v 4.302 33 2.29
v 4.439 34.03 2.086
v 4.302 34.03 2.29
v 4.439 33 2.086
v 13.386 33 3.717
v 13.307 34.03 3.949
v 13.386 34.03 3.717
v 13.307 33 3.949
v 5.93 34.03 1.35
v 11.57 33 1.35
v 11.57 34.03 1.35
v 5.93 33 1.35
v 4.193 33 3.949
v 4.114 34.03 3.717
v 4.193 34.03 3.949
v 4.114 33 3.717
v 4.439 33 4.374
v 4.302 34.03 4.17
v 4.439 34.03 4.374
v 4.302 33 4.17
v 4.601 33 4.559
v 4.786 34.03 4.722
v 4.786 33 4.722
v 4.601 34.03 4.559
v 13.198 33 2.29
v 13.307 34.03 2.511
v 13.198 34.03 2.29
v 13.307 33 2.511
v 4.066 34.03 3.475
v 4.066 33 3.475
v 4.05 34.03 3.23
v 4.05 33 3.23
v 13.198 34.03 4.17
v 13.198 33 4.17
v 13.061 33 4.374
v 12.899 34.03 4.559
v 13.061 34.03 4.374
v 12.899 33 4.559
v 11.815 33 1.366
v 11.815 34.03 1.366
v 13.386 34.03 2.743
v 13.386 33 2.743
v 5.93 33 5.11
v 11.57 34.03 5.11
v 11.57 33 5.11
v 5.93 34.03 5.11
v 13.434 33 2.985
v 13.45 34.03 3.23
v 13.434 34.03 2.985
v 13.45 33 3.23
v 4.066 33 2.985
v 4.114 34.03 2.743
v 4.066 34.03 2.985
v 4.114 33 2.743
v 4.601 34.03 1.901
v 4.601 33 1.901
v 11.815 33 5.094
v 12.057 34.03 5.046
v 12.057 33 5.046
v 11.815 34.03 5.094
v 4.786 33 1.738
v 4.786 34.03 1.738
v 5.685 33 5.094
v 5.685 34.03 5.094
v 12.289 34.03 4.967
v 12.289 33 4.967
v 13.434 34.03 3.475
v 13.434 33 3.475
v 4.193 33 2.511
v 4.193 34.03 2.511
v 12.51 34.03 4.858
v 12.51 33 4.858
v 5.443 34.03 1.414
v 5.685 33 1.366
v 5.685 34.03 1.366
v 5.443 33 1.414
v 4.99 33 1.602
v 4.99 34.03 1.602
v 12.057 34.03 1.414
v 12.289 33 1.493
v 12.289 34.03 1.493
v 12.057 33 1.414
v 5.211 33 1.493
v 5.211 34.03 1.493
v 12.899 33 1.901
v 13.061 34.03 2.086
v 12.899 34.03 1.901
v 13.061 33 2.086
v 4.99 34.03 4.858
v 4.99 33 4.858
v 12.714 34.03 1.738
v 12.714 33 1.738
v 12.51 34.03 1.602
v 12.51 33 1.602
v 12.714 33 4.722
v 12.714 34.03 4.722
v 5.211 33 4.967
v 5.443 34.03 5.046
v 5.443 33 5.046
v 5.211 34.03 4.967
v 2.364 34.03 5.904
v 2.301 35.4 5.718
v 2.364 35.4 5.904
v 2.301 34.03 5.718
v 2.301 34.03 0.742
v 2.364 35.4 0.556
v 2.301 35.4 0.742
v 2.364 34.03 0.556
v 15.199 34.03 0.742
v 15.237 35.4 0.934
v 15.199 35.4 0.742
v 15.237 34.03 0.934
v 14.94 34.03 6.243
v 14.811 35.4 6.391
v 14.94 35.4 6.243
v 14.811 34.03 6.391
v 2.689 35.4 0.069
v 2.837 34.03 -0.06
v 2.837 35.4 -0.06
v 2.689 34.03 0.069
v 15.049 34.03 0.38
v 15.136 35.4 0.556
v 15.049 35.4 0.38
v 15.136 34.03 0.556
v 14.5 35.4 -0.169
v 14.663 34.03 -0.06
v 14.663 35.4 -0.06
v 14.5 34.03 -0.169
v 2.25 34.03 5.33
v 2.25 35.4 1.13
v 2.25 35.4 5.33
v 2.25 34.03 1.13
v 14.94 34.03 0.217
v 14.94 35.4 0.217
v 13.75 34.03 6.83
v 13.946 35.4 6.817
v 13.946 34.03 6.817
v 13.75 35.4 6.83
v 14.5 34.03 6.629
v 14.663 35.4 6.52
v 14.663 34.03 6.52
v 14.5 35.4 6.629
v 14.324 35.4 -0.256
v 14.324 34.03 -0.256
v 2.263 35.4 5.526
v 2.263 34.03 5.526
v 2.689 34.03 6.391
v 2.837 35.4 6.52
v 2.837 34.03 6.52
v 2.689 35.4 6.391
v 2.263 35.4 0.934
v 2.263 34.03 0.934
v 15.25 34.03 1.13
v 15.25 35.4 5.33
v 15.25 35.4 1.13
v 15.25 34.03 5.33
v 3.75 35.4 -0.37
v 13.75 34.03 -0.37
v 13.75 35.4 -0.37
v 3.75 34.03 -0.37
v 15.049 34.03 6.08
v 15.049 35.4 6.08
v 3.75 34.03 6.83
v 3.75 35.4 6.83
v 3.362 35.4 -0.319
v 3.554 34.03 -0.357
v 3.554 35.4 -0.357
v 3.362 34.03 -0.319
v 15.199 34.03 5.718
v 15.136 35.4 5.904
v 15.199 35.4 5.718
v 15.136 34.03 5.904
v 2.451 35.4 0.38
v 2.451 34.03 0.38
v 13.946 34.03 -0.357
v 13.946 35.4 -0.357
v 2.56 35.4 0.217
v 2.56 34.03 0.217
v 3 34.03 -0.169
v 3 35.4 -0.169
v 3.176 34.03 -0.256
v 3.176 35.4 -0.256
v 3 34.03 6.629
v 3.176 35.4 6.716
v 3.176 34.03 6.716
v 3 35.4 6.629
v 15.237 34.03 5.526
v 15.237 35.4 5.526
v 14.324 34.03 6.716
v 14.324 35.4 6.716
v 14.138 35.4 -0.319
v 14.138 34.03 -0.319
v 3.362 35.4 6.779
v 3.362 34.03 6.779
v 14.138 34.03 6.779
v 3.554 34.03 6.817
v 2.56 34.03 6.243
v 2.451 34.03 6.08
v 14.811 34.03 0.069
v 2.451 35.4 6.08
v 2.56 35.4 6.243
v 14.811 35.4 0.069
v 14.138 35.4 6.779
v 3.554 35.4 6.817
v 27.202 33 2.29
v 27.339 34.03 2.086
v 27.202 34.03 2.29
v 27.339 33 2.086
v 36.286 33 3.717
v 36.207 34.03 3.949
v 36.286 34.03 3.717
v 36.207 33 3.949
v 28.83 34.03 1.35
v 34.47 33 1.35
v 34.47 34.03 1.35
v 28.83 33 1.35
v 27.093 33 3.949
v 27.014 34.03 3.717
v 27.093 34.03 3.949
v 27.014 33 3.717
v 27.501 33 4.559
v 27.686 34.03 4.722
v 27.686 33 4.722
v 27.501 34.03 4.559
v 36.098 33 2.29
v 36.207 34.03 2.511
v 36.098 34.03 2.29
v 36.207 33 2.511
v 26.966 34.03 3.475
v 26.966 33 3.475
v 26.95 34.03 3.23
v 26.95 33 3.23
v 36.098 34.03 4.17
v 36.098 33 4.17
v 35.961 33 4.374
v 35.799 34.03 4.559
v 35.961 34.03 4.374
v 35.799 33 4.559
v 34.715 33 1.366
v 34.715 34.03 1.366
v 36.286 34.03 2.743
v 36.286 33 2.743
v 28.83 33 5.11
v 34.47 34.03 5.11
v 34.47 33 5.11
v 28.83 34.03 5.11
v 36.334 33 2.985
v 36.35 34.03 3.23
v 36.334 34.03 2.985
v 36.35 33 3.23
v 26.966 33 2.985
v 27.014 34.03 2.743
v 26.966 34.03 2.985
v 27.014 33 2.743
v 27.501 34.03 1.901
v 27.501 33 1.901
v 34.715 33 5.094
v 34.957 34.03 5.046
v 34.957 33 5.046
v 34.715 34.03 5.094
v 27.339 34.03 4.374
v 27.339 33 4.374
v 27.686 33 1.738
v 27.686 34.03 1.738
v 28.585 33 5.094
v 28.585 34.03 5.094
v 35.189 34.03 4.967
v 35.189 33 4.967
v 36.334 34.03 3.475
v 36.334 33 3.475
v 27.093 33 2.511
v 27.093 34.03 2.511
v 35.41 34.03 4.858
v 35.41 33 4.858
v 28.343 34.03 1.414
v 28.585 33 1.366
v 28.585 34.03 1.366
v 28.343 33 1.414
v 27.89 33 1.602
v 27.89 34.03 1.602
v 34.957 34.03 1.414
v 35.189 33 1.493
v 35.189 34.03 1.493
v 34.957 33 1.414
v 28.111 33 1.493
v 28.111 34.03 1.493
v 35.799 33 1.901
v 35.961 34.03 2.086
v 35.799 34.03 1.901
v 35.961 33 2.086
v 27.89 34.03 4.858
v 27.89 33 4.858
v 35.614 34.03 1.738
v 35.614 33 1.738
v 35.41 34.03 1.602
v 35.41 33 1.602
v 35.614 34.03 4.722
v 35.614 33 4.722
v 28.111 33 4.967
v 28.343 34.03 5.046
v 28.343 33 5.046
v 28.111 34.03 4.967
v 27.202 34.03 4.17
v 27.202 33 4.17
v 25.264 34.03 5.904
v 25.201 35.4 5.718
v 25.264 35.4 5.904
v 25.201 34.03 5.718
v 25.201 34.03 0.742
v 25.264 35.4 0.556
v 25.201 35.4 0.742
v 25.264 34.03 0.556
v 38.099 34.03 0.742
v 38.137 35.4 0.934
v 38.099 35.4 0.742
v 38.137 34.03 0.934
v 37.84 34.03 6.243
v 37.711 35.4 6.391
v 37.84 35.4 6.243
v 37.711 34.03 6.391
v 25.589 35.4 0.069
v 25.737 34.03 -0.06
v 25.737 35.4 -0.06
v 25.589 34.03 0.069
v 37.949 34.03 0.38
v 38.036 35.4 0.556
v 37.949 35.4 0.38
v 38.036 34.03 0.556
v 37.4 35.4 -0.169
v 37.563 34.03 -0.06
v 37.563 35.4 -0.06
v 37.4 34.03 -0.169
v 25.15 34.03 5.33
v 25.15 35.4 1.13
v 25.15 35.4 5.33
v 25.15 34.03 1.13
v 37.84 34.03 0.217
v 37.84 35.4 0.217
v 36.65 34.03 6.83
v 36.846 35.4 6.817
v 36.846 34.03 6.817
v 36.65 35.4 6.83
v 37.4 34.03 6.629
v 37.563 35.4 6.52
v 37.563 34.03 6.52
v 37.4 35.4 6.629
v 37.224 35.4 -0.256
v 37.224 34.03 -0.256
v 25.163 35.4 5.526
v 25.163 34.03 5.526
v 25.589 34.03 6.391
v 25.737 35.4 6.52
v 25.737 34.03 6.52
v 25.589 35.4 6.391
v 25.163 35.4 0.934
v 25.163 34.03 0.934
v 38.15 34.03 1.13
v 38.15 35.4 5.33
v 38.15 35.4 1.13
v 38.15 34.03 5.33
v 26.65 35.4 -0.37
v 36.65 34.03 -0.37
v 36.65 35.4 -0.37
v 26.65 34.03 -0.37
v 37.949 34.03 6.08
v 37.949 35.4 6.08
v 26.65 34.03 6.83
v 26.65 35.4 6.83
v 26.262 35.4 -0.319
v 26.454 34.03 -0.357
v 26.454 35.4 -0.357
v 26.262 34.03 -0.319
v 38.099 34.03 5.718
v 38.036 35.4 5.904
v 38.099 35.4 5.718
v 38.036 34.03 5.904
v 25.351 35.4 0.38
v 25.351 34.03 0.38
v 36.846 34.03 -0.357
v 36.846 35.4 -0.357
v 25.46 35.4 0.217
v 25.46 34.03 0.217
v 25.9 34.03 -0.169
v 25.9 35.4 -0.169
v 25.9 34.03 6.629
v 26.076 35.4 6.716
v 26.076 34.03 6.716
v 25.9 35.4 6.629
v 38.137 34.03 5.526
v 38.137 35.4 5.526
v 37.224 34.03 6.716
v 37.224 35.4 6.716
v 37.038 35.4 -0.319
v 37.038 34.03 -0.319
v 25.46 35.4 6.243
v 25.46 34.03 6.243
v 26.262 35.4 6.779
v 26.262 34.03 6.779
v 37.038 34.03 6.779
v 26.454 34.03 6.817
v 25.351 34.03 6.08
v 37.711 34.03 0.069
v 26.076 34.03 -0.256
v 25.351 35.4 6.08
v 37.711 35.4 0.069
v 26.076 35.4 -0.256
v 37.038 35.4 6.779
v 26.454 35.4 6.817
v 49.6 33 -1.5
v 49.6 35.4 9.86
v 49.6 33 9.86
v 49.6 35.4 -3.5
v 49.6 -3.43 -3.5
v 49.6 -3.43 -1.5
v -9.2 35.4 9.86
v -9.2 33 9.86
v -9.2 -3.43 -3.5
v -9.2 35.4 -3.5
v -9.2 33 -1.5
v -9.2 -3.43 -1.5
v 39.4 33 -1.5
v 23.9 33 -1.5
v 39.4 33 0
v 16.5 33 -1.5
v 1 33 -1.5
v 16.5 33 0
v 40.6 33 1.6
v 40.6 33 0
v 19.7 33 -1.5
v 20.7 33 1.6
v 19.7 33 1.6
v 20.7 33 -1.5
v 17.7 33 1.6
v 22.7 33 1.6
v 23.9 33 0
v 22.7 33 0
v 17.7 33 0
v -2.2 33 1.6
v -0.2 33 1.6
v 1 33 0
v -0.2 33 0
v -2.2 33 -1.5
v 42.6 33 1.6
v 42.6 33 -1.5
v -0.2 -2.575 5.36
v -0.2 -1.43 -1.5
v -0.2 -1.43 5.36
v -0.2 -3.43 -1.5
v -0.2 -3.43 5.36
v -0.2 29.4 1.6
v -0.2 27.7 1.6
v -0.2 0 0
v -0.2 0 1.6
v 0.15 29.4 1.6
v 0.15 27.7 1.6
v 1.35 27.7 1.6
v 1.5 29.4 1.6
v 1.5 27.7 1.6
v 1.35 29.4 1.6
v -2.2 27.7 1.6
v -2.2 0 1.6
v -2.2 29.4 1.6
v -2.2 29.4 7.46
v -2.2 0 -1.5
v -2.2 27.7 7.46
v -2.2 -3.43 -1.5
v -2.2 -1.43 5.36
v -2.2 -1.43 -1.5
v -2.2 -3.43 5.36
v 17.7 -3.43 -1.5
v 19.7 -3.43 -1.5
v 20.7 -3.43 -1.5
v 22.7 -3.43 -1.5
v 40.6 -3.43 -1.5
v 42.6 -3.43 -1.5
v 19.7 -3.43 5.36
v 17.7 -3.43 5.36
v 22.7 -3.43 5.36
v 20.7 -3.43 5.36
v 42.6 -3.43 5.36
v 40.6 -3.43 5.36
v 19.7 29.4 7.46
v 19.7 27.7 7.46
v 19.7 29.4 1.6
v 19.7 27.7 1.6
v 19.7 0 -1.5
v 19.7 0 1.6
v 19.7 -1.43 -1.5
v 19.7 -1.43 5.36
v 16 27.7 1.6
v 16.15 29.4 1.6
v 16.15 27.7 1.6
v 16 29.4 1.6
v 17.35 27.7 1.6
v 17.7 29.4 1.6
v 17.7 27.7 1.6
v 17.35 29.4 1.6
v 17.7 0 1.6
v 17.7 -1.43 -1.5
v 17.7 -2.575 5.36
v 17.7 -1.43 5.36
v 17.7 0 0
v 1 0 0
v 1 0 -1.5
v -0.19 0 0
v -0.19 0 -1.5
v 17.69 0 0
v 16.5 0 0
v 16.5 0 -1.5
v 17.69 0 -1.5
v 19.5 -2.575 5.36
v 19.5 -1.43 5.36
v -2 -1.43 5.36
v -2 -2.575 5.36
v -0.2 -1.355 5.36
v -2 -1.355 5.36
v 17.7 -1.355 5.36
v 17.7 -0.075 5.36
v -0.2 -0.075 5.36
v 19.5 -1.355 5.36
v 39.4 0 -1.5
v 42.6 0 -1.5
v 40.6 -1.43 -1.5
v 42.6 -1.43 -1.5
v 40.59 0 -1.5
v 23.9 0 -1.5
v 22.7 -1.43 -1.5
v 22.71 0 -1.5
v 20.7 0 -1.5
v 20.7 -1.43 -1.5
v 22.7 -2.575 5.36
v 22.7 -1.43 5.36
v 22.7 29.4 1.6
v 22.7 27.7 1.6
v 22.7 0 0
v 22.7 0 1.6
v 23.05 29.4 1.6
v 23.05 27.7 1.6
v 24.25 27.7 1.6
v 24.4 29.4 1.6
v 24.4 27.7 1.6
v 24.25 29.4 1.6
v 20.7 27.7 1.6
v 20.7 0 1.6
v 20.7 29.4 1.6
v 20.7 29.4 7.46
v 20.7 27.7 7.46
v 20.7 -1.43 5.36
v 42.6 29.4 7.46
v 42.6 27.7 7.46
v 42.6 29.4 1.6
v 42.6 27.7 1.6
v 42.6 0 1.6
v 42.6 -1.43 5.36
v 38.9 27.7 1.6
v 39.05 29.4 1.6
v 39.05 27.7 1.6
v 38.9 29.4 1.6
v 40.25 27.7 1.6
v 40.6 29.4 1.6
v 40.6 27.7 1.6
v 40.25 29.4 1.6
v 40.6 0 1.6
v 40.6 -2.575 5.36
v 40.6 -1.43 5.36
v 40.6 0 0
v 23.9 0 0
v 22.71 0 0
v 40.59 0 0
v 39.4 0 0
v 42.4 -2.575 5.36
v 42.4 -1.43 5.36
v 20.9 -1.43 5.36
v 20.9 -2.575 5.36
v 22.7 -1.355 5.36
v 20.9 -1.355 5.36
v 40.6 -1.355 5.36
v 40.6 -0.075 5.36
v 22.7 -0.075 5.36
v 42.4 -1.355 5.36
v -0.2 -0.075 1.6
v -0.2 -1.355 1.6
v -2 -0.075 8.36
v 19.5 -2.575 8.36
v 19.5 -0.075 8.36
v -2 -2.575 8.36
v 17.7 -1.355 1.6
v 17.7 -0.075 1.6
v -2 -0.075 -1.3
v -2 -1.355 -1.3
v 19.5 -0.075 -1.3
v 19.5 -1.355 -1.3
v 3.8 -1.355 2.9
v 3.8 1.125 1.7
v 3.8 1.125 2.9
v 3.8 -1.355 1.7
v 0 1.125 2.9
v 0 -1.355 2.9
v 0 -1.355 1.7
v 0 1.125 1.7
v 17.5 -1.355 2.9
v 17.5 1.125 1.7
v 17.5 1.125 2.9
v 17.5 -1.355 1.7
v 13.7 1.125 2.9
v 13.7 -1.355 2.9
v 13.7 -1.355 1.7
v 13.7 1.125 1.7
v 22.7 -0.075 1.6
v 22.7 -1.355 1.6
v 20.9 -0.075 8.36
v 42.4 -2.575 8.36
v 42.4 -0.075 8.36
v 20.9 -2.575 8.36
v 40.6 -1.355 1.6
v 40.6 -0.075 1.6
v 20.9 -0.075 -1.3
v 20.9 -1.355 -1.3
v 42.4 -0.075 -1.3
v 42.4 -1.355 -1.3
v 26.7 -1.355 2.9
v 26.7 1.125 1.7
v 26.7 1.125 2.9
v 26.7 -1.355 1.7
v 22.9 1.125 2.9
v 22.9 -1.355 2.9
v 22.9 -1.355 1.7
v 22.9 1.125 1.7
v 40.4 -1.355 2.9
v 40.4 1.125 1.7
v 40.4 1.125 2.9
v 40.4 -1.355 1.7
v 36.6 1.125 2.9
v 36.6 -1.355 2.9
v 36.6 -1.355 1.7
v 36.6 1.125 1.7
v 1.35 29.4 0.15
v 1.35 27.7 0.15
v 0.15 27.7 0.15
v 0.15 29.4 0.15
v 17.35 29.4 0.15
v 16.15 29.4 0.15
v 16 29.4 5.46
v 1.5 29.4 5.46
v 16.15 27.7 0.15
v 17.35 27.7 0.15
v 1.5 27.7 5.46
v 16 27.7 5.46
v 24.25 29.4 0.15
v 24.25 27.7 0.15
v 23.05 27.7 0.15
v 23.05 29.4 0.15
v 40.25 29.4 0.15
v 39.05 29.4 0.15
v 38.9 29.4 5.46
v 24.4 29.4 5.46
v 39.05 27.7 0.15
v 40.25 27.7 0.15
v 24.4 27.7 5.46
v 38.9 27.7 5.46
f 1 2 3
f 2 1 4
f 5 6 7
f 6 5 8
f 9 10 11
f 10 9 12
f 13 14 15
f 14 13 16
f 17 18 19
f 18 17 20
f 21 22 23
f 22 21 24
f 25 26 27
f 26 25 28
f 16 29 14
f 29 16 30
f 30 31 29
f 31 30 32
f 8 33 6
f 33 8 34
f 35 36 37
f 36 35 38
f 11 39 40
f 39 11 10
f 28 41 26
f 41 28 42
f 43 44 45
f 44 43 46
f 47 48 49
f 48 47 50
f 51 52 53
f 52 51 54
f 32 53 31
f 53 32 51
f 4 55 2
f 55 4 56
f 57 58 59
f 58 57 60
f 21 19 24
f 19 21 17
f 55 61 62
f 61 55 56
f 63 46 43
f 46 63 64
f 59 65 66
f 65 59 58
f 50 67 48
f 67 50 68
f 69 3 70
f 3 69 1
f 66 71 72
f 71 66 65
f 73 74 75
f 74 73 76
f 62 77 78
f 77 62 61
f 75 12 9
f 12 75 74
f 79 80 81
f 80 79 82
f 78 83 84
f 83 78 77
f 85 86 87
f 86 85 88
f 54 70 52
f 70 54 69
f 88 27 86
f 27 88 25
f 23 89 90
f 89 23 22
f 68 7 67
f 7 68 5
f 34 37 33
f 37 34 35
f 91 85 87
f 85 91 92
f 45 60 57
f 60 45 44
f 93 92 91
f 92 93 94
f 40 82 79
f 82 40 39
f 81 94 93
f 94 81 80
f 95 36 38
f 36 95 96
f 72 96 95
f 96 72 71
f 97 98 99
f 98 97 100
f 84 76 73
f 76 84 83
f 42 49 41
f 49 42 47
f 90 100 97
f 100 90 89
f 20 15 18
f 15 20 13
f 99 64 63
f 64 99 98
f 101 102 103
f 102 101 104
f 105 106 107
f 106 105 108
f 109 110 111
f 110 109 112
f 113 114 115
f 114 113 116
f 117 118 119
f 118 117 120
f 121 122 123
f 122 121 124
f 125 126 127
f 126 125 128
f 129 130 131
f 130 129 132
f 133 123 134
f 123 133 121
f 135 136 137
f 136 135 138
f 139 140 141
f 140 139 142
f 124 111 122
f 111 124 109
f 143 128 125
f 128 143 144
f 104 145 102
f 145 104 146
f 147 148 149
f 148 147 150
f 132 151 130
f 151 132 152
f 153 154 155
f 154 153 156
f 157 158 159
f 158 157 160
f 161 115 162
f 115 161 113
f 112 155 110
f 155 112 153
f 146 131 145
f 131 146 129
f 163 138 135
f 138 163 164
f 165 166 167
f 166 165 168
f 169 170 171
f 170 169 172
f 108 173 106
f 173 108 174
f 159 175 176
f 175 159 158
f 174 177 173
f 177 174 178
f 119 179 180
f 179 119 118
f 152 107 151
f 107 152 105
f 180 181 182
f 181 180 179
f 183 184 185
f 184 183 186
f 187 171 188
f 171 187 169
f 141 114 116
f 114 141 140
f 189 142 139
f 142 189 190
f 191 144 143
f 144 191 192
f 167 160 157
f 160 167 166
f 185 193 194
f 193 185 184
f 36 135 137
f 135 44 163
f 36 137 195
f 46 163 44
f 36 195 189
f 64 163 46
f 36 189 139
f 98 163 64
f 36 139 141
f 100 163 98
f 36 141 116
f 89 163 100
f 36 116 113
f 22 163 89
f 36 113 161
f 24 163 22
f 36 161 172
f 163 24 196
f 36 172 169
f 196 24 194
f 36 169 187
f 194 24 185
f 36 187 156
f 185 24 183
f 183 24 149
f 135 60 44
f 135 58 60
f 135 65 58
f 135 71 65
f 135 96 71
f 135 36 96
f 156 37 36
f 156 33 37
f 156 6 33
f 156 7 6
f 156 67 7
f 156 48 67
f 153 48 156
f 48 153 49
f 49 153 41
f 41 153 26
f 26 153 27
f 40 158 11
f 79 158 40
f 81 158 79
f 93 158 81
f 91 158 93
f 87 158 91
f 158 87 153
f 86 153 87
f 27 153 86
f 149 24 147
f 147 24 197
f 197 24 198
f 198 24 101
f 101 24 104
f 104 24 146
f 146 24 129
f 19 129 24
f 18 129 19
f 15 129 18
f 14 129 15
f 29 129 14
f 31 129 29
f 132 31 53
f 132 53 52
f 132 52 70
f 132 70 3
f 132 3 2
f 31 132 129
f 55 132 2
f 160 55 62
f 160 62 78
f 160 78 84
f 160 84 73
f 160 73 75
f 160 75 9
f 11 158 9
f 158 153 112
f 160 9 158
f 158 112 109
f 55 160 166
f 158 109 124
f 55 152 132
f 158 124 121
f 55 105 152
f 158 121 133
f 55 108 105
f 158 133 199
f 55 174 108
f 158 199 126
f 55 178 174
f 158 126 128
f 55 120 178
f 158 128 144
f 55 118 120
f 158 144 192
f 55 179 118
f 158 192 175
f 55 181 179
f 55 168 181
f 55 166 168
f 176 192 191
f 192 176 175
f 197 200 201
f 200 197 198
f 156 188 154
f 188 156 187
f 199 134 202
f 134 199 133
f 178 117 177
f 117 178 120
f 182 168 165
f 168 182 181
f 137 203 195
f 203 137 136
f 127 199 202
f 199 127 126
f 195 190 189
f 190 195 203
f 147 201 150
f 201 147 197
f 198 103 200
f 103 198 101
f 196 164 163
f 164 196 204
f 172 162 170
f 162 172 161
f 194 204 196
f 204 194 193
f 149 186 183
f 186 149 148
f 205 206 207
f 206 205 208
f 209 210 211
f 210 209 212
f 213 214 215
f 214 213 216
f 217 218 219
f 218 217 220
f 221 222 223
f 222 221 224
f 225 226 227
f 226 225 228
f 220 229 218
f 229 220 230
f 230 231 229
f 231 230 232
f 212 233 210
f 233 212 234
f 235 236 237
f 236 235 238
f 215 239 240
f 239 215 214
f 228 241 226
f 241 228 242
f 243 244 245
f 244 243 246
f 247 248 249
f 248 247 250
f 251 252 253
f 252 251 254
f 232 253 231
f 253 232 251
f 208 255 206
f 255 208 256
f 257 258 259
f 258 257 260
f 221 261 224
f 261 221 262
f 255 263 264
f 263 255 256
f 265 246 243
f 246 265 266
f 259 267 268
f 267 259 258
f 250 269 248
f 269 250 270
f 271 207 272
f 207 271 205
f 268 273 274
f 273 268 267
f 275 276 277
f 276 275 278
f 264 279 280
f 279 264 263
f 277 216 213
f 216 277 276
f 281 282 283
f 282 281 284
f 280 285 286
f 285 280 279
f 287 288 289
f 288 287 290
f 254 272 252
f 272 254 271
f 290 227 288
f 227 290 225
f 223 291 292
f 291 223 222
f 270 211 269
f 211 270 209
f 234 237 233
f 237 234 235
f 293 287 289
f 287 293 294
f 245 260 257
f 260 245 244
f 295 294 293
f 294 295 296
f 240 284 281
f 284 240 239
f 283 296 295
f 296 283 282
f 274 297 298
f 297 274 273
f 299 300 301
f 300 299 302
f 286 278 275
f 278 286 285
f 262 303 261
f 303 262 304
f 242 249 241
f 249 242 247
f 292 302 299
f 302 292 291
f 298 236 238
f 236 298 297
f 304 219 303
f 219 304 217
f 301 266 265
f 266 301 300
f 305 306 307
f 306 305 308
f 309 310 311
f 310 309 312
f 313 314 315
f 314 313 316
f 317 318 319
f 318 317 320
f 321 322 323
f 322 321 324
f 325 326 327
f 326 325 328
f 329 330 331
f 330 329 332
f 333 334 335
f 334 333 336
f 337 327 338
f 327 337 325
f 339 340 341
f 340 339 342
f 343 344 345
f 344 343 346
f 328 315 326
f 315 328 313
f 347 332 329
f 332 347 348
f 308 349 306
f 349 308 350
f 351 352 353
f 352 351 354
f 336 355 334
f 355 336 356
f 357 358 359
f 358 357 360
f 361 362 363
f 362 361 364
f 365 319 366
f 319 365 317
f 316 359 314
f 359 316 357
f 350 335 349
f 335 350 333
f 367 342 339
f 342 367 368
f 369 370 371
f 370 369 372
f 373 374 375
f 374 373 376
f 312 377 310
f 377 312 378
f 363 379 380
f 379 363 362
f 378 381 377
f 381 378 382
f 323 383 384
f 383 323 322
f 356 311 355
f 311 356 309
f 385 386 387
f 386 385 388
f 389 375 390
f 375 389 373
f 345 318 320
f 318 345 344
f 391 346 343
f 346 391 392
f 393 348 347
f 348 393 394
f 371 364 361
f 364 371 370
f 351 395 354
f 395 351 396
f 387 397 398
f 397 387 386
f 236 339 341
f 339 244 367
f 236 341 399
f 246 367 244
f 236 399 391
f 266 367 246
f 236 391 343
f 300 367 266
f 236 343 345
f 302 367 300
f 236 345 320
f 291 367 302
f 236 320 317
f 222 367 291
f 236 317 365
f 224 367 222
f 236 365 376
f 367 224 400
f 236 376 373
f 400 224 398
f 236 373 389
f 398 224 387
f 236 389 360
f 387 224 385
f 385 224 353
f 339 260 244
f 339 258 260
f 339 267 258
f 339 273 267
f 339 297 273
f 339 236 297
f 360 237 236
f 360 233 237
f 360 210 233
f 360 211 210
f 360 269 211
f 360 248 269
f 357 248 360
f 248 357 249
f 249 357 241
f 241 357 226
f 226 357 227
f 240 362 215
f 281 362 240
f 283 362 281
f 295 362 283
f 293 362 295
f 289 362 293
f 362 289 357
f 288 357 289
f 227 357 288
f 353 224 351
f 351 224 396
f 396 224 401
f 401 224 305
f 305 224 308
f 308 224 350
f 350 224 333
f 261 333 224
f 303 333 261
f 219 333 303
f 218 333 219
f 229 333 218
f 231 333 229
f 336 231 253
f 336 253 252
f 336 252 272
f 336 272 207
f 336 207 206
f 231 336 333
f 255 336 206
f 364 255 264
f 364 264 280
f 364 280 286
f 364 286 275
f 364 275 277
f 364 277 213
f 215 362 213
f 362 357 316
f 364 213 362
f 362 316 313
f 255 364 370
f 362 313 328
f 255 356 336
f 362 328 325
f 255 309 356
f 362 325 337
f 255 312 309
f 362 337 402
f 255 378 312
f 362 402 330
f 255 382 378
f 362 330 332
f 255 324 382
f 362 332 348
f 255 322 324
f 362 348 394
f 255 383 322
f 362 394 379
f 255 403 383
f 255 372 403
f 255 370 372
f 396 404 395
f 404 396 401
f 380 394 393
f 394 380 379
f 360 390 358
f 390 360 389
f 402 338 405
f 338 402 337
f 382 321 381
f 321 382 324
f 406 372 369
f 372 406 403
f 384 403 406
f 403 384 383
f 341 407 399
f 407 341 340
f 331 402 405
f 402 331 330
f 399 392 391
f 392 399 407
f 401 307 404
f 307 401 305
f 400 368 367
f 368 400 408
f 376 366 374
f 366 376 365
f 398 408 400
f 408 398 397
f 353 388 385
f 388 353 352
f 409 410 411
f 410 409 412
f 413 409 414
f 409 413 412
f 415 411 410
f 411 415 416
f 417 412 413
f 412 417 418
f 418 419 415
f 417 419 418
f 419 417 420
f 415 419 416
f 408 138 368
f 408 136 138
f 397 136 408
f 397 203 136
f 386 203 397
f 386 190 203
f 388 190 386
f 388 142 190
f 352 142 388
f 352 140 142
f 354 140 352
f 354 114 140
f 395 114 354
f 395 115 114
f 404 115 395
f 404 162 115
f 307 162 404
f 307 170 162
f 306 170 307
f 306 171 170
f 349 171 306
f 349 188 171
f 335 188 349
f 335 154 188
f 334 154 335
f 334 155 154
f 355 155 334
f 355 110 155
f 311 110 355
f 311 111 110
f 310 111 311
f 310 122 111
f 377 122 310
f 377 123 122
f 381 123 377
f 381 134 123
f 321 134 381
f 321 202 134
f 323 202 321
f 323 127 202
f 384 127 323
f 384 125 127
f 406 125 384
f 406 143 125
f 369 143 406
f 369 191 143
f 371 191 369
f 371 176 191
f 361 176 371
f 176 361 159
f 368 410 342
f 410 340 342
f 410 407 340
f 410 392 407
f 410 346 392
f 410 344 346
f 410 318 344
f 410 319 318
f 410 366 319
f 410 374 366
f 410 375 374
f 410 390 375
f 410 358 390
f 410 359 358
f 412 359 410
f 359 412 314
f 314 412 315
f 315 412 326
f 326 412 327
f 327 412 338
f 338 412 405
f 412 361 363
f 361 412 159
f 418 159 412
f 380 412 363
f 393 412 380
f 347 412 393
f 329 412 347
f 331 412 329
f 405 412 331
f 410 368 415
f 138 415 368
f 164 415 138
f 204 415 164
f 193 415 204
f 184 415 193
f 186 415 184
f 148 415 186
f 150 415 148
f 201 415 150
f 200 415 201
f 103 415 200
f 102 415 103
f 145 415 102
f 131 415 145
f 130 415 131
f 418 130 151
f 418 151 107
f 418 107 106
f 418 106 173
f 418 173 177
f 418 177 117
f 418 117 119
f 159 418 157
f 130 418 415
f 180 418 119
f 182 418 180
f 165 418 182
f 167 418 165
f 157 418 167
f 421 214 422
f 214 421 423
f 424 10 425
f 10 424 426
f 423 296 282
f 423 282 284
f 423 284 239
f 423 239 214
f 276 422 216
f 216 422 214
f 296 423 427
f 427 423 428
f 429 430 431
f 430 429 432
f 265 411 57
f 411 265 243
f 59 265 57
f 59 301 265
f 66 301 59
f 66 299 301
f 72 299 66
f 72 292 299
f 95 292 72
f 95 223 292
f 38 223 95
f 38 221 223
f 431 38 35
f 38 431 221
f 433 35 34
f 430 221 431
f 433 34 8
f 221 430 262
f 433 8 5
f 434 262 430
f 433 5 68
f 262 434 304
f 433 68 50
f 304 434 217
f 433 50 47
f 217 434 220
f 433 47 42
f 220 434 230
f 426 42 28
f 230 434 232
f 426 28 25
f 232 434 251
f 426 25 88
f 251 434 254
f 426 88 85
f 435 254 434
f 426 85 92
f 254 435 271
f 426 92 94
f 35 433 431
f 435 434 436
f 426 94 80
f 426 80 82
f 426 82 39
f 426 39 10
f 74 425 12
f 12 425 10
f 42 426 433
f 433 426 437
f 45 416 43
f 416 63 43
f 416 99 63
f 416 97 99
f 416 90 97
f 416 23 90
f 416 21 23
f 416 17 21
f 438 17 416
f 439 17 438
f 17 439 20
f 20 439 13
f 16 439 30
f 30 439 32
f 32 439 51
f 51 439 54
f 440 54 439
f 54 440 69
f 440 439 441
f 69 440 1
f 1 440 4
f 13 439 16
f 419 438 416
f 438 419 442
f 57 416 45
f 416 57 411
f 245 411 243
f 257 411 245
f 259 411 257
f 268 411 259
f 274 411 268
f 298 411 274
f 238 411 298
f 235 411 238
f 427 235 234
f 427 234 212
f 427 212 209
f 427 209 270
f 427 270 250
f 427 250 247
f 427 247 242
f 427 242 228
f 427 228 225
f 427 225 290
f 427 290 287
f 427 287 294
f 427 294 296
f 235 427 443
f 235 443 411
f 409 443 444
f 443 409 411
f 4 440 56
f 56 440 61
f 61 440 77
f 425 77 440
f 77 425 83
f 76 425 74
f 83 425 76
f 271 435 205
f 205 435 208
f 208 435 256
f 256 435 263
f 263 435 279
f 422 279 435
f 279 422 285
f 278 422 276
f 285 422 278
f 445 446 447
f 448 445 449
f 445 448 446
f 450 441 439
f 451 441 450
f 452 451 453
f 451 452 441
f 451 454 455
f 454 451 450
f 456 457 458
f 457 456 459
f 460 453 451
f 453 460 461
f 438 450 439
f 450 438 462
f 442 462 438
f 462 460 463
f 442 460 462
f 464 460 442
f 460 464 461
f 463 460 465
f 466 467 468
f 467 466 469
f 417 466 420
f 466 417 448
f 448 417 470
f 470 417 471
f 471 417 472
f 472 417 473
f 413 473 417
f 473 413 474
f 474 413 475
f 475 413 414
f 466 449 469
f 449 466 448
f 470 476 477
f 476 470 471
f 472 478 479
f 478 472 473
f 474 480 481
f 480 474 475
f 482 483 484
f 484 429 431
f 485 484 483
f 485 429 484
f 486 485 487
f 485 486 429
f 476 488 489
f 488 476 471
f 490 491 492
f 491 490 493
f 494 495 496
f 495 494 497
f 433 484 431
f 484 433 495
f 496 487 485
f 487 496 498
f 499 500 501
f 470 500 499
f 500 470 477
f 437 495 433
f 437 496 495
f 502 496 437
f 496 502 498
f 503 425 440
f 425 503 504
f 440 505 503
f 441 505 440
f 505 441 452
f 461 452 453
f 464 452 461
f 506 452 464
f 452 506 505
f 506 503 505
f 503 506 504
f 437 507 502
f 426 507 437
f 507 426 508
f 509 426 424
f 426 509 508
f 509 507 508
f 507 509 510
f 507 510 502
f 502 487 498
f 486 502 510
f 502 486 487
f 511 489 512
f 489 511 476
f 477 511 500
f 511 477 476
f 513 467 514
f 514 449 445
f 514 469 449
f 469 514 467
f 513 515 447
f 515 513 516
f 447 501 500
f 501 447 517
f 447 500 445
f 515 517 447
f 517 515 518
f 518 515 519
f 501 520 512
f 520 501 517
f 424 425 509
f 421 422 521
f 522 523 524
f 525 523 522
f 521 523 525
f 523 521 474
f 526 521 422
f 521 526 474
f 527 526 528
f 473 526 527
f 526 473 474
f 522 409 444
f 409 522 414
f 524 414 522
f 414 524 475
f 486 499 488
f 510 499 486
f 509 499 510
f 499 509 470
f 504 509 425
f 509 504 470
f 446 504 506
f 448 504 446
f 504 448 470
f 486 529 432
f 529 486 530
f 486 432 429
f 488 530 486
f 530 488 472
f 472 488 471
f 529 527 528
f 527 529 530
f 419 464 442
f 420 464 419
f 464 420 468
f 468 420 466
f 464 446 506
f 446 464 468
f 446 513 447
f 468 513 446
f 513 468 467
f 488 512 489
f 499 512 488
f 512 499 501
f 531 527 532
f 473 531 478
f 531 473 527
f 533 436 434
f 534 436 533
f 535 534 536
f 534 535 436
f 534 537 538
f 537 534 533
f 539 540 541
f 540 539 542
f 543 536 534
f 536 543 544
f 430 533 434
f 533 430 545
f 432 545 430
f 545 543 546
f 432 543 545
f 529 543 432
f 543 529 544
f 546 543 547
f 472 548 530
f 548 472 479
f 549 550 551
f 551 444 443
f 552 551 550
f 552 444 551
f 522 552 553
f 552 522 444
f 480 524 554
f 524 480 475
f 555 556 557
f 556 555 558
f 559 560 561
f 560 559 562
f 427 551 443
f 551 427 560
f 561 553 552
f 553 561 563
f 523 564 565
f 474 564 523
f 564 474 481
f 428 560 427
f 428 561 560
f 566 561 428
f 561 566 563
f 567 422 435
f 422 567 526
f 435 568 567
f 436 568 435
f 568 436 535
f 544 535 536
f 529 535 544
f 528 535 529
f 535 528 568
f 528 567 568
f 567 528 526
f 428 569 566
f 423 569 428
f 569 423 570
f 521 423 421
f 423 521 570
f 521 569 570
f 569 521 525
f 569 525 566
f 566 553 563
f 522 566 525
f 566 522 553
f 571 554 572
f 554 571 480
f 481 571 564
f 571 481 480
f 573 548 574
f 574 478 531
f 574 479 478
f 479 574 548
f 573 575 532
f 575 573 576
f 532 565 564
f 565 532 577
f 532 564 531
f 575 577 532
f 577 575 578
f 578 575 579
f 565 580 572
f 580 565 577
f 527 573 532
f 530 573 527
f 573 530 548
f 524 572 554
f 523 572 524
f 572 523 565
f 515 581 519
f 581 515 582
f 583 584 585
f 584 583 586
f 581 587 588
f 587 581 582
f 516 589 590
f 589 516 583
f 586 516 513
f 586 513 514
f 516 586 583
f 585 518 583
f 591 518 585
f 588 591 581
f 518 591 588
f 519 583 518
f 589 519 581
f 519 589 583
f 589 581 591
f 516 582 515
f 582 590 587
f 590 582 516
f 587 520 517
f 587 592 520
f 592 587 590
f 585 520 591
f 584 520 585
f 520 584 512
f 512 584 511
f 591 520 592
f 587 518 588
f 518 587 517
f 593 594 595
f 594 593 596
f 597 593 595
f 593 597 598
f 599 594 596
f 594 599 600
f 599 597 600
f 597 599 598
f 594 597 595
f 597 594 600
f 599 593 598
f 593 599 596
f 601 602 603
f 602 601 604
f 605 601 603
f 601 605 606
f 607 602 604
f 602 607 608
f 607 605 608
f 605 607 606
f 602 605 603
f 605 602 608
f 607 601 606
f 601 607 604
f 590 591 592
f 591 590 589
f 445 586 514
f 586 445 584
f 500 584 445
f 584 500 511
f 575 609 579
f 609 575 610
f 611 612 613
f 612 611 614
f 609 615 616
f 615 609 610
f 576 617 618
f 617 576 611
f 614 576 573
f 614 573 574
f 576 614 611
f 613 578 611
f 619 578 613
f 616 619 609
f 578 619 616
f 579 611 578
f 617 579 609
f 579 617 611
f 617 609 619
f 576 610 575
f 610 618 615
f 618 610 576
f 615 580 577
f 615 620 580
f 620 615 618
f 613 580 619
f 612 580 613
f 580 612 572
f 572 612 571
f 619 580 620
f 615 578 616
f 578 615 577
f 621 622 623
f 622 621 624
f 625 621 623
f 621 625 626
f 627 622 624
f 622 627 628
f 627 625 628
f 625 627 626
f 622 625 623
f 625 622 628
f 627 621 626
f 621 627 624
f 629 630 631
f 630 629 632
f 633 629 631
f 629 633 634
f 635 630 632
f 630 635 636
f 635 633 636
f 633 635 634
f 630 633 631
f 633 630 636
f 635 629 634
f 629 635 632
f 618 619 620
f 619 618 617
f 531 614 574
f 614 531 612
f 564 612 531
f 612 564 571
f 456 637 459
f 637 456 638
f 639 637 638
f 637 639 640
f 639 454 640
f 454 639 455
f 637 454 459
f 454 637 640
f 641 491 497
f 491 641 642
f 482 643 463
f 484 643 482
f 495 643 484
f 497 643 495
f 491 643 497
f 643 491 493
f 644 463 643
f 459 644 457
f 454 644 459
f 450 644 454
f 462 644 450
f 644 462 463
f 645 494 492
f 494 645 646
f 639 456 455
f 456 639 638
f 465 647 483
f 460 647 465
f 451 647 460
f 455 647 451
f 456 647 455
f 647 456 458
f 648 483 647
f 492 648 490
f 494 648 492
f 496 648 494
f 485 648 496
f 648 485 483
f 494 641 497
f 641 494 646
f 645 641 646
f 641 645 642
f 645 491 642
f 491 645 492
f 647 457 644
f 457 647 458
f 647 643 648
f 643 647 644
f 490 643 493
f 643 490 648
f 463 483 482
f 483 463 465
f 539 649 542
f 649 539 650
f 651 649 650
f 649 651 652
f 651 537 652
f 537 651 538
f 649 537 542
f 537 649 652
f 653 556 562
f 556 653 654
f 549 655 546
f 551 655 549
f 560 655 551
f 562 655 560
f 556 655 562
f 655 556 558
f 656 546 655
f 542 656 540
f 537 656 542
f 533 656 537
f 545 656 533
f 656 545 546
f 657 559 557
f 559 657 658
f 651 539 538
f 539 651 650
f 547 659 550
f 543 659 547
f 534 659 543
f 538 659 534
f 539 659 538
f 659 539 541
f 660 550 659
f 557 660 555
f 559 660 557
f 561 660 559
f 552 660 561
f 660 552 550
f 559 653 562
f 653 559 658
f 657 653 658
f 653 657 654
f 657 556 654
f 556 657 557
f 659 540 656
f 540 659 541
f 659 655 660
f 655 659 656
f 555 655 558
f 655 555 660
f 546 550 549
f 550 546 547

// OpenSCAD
// Two-port USB-C wall + cradle test coupon for the Waveshare RP2350-USB-C.
//
// Purpose: check port alignment, cable seating, side-by-side cable crowding,
// and that plug forces go into the enclosure instead of the board's solder
// joints — before designing the full box.
//
// Layout decision (docs/decisions.md): both input ports side by side on one
// face. This coupon prints BOTH, because two plug overmolds fouling each other
// is the main risk of that layout and a one-port coupon cannot show it.
//
// Parts:
//   coupon() — base, wall with two USB-C openings, two board cradles
//   key()    — drop-in clip behind one board: takes push-in force on the PCB
//              corners and holds the back of the board down. Print two.
//              It has a window for the board's INNER USB-C connector.
//
// Assembly, per board: lower it into the cradle about 1.5 mm back from the
// wall, slide it forward so the outer USB-C shell enters the opening, then
// drop a key() into the slots behind it.
//
// NOT tested by this coupon: blocking the inner USB-C port. That port is live
// on the board's 5V net (hardware/wiring.md), so the full box must make it
// unreachable. The coupon leaves it open so the fit can be inspected.
//
// Coordinates (board A frame):
//   X = across the boards, board A occupies 0..17.50
//   Y = along the boards, 0 = inner (back) edge, 33.00 = outer (port) edge
//   Z = 0 at the board's bottom face
//
// Values marked MEASURE are not in Waveshare's drawing. Check them with
// calipers on a real board and edit before printing the final enclosure.

/* [Board — Waveshare RP2350-USB-C] */
board_w = 17.50;   // Waveshare dimensioned drawing
board_l = 33.00;   // Waveshare dimensioned drawing
board_r = 2.00;    // corner radius, drawing (cradle is square; this is reference)
pcb_t   = 1.60;    // MEASURE: PCB thickness (assumed 1.6)

/* [USB-C receptacles — one at each end, centred] */
usb_w    = 8.90;   // shell width: board_w - 2*4.30, from the drawing
usb_h    = 3.26;   // MEASURE: shell height (typical top-mount value)
usb_over = 1.03;   // MEASURE: shell overhang past the board edge (QT Py value)
usb_cx   = board_w / 2;   // centred, from the drawing

/* [Retention notches — port end only] */
// Two rectangular cutouts, one in each long edge, near the exposed port end.
// Waveshare does NOT dimension them; these come from measuring their drawing
// pixel by pixel, so treat them as +/- 0.15 mm and MEASURE on a real board.
// The inner end has no notches: what looks like notches there is the row of
// castellated pads (about 0.5 mm deep).
notch_d   = 3.45;  // MEASURE: notch's near edge, from the port edge
notch_len = 2.00;  // MEASURE: length along the board
notch_dep = 1.50;  // MEASURE: depth into each long edge
notch_c   = 0.15;  // peg clearance per face

/* [Side-by-side spacing] */
// Port centre spacing = board_w + 2*fit + side_t + pitch_extra.
// With pitch_extra = 3.0 that is about 22.9 mm, which clears two overmolds up
// to ~22 mm wide. Lower it to shrink the box; raise it if your fattest cables
// collide. This is the number the coupon exists to test.
pitch_extra = 3.0;

/* [Fit — tune with this print] */
fit       = 0.20;  // board-to-pocket clearance per side
hole_c    = 0.25;  // shell-to-opening clearance per side
key_fit   = 0.15;  // key blade play in its slot
win_c     = 0.50;  // key window clearance around the inner shell, per side

/* [Wall] */
wall_t    = 2.4;
wall_top  = pcb_t + usb_h + 5;   // wall height above board bottom
wall_pad  = 7;                   // wall overhang past the outer cradle walls

/* [Cable overmold pockets, outer face] */
om_w = 13.0;       // pocket width  (fits most USB-C overmolds)
om_h = 7.2;        // pocket height
om_r = 1.5;        // pocket corner radius
mouth_recess = 0;  // pocket floor distance in front of receptacle mouth

/* [Cradle] */
under_clear = 1.5; // MEASURE: gap under board for underside parts
base_t      = 2.0;
side_t      = 2.0;
ledge_w     = 1.0; // support ledges under the long edges

/* [Key (back retainer)] */
install_margin = 0.4;                // extra room to lower the board past the shell overhang
key_t   = usb_over + install_margin; // slot width in Y
back_t  = 2.0;                       // post material behind the slot
lip_t   = 1.2;                       // lip thickness over the board top
lip_len = 1.2;                       // lip reach over the board
grip_h  = 3.0;                       // key sticks up this far above the posts
rib_t   = 2.5;                       // key thickness in Y above the board: stiffens the thin blade

/* [Hidden] */
$fn = 48;
eps = 0.01;

// Derived ------------------------------------------------------------------
pitch   = board_w + 2 * fit + side_t + pitch_extra;  // board A left edge -> board B left edge
usb_cx_a = usb_cx;
usb_cx_b = pitch + usb_cx;

z_base_top = -under_clear;
z_base_bot = -under_clear - base_t;
y_wall_in  = board_l;
y_wall_out = board_l + wall_t;
y_back     = -(key_t + back_t);
usb_zc     = pcb_t + usb_h / 2;
z_shell_top = pcb_t + usb_h;          // top of the inner USB-C shell
z_rib0      = z_shell_top + win_c;    // stiffening rib starts clear above it
z_rib1      = z_rib0 + grip_h;
z_post_top  = z_rib0;                 // posts guide the key up to the rib

// Notch extents in board-local Y (0 = inner edge, board_l = port edge)
ny1 = board_l - notch_d;
ny0 = ny1 - notch_len;
// Peg footprint inside a notch
py0 = ny0 + notch_c;
py1 = ny1 - notch_c;
bar_z0 = pcb_t + usb_h + 0.6;   // crossbar clears the USB shell
bar_t  = 2.0;
bar_z1 = bar_z0 + bar_t;

// Inner-shell window in the key, in board-local X
win_x0 = usb_cx - usb_w / 2 - win_c;
win_x1 = usb_cx + usb_w / 2 + win_c;
// The key bears on the PCB back edge outside that window
bear_spans = [[0, win_x0], [win_x1, board_w]];

// Outer extents of the whole coupon
x_lo = -fit - side_t;
x_hi = pitch + board_w + fit + side_t;
wall_x0 = x_lo - wall_pad;
wall_x1 = x_hi + wall_pad;

// Accessors so tests/fit_checks.scad never duplicates these numbers.
// OpenSCAD's `use <>` imports functions and modules, but not variables.
function p_pitch()  = pitch;
function p_board()  = [board_w, board_l, pcb_t];
function p_usb()    = [usb_w, usb_h, usb_over, usb_cx];
function p_margin() = install_margin;
function p_notch()  = [notch_d, notch_len, notch_dep];
function p_peg_z()  = [py0, py1, bar_z1];

// The board outline, notches included. Shared by the preview and the checks.
module board_outline(x0, h) {
    difference() {
        translate([x0, 0, 0]) cube([board_w, board_l, h]);
        translate([x0 - eps, ny0, -eps])
            cube([notch_dep + eps, notch_len, h + 2 * eps]);
        translate([x0 + board_w - notch_dep, ny0, -eps])
            cube([notch_dep + eps, notch_len, h + 2 * eps]);
    }
}

module rrect(w, h, r, d) {
    // rounded rectangle in XZ, centred, extruded along +Y by d
    // hull of corner circles: stays valid when r = h/2 (stadium shape),
    // where offset() of a zero-height square would produce nothing
    rr = min(r, w / 2, h / 2);
    rotate([-90, 0, 0])
        linear_extrude(d)
            hull()
                for (sx = [-1, 1], sz = [-1, 1])
                    translate([sx * (w / 2 - rr), sz * (h / 2 - rr)]) circle(rr);
}

module wall() {
    difference() {
        translate([wall_x0, y_wall_in, z_base_bot])
            cube([wall_x1 - wall_x0, wall_t, wall_top - z_base_bot]);
        for (cx = [usb_cx_a, usb_cx_b]) {
            // shell opening, through
            translate([cx, y_wall_in - eps, usb_zc])
                rrect(usb_w + 2 * hole_c, usb_h + 2 * hole_c,
                      (usb_h + 2 * hole_c) / 2, wall_t + 2 * eps);
            // overmold pocket; floor sits mouth_recess in front of the receptacle mouth
            pocket_d = y_wall_out - (y_wall_in + usb_over + mouth_recess);
            if (pocket_d > 0)
                translate([cx, y_wall_out - pocket_d, usb_zc])
                    rrect(om_w, om_h, om_r, pocket_d + eps);
        }
    }
}

// One board's cradle. x0 = that board's left edge.
module cradle(x0) {
    x_in_l  = x0 - fit;
    x_in_r  = x0 + board_w + fit;
    difference() {
        union() {
            // side rails, flush with board top so the castellated pads stay reachable
            for (xs = [x_in_l - side_t, x_in_r])
                translate([xs, y_back, z_base_top - eps])
                    cube([side_t, y_wall_in - y_back + eps, pcb_t - z_base_top + eps]);
            // ledges under the long edges
            for (xs = [x_in_l, x0 + board_w - ledge_w])
                translate([xs, 0, z_base_top - eps])
                    cube([ledge_w + fit, board_l, -z_base_top + eps]);
            // taller back posts that hold the key
            for (xs = [x_in_l - side_t, x_in_r])
                translate([xs, y_back, z_base_top - eps])
                    cube([side_t, back_t + key_t, z_post_top - z_base_top + eps]);
        }
        // key slots through the back posts
        for (xs = [x_in_l - side_t, x_in_r])
            translate([xs - eps, -key_t, z_base_top])
                cube([side_t + 2 * eps, key_t, z_post_top - z_base_top + 1]);
    }
}

module base_plate() {
    translate([min(x_lo, wall_x0), y_back, z_base_bot])
        cube([max(x_hi, wall_x1) - min(x_lo, wall_x0),
              y_wall_in - y_back + eps, base_t]);
}

module coupon() {
    union() {
        base_plate();
        wall();
        cradle(0);
        cradle(pitch);
    }
}

// One key. x0 = that board's left edge. Print two.
//
// Cross-section, looking along X at the board centre:
//
//   z_rib1  ┌────────┐            rib: full length, thick in Y, grips here
//           │  rib   │
//   z_rib0  └────────┘            starts clear above the inner shell
//              ( )                inner USB-C shell passes through, open
//   pcb_t   ┌──┐                  lips (only outside the shell span)
//           │bl│                  lower blade: bears on the WHOLE PCB back edge
//   base    └──┘
//
// Everything between pcb_t and z_rib0 exists only outside the shell span and
// at the two ends that ride in the post slots.
module key(x0) {
    x_in_l = x0 - fit;
    x_in_r = x0 + board_w + fit;
    blade  = key_t - key_fit;
    len    = (x_in_r + side_t) - (x_in_l - side_t) - 0.4;
    xk     = x_in_l - side_t + 0.2;
    y0     = -key_t + key_fit / 2;
    union() {
        // lower blade: full length, up to the board top. Takes push-in force
        // across the whole PCB back edge, including under the connector.
        translate([xk, y0, z_base_top + 0.2])
            cube([len, blade, pcb_t - (z_base_top + 0.2)]);
        // end blocks: ride in the post slots, full height
        for (xs = [xk, x_in_r + 0.0])
            translate([xs, y0, pcb_t])
                cube([side_t - 0.2, blade, z_rib1 - pcb_t]);
        // stiffening rib: full length, clear above the inner shell
        translate([xk, y0 - (rib_t - blade), z_rib0])
            cube([len, rib_t, z_rib1 - z_rib0]);
        // lips over the board top, only outside the shell span
        for (s = bear_spans)
            translate([x0 + s[0], y0, pcb_t + 0.1])
                cube([s[1] - s[0], blade + lip_len, lip_t]);
    }
}

// Notch staple: two pegs that drop into the board's retention notches, joined
// by a crossbar that bridges over the USB shell. Shoulders rest on the cradle
// rails, so it also holds the board down.
//
// In the full box these pegs are expected to hang from the LID instead, which
// would let the staple and the key both disappear. The coupon prints it as a
// separate part so the notch fit can be felt before committing to that.
module staple(x0) {
    x_in_l = x0 - fit;
    x_in_r = x0 + board_w + fit;
    union() {
        // pegs, inside the notches
        translate([x0 + notch_c, py0, 0.15])
            cube([notch_dep - 2 * notch_c, py1 - py0, pcb_t - 0.15]);
        translate([x0 + board_w - notch_dep + notch_c, py0, 0.15])
            cube([notch_dep - 2 * notch_c, py1 - py0, pcb_t - 0.15]);
        // shoulders: from above the board top out over the cradle rails
        translate([x_in_l - side_t, py0, pcb_t])
            cube([(x0 + notch_dep) - (x_in_l - side_t), py1 - py0, bar_z0 - pcb_t]);
        translate([x0 + board_w - notch_dep, py0, pcb_t])
            cube([(x_in_r + side_t) - (x0 + board_w - notch_dep), py1 - py0, bar_z0 - pcb_t]);
        // crossbar, clear above the USB shell
        translate([x_in_l - side_t, py0, bar_z0])
            cube([(x_in_r + side_t) - (x_in_l - side_t), py1 - py0, bar_t]);
    }
}

// Ghost boards and shells, preview only (F5)
module board_ghost(x0) {
    %color("SteelBlue", 0.5) board_outline(x0, pcb_t);
    // outer shell (into the wall) and inner shell (through the key window)
    %color("Silver", 0.6)
        translate([x0 + usb_cx, board_l + usb_over - 7.35, usb_zc])
            rrect(usb_w, usb_h, usb_h / 2, 7.35);
    %color("Silver", 0.6)
        translate([x0 + usb_cx, -usb_over, usb_zc])
            rrect(usb_w, usb_h, usb_h / 2, 7.35);
}

/* [Output] */
part = "preview"; // [preview, coupon, key, staple]

if (part == "coupon") {
    translate([0, 0, -z_base_bot]) coupon();       // base on the bed
} else if (part == "key") {
    rotate([90, 0, 0]) translate([-x_lo, key_t - key_fit / 2, 0]) key(0);
} else if (part == "staple") {
    // lie it on its flat face: 1.7 mm thick, no supports
    rotate([90, 0, 0]) translate([-x_lo, -py0, -bar_z1]) staple(0);
} else {
    coupon();
    color("DarkOrange") { key(0); key(pitch); }
    color("MediumBlue") { staple(0); staple(pitch); }
    board_ghost(0);
    board_ghost(pitch);
}
